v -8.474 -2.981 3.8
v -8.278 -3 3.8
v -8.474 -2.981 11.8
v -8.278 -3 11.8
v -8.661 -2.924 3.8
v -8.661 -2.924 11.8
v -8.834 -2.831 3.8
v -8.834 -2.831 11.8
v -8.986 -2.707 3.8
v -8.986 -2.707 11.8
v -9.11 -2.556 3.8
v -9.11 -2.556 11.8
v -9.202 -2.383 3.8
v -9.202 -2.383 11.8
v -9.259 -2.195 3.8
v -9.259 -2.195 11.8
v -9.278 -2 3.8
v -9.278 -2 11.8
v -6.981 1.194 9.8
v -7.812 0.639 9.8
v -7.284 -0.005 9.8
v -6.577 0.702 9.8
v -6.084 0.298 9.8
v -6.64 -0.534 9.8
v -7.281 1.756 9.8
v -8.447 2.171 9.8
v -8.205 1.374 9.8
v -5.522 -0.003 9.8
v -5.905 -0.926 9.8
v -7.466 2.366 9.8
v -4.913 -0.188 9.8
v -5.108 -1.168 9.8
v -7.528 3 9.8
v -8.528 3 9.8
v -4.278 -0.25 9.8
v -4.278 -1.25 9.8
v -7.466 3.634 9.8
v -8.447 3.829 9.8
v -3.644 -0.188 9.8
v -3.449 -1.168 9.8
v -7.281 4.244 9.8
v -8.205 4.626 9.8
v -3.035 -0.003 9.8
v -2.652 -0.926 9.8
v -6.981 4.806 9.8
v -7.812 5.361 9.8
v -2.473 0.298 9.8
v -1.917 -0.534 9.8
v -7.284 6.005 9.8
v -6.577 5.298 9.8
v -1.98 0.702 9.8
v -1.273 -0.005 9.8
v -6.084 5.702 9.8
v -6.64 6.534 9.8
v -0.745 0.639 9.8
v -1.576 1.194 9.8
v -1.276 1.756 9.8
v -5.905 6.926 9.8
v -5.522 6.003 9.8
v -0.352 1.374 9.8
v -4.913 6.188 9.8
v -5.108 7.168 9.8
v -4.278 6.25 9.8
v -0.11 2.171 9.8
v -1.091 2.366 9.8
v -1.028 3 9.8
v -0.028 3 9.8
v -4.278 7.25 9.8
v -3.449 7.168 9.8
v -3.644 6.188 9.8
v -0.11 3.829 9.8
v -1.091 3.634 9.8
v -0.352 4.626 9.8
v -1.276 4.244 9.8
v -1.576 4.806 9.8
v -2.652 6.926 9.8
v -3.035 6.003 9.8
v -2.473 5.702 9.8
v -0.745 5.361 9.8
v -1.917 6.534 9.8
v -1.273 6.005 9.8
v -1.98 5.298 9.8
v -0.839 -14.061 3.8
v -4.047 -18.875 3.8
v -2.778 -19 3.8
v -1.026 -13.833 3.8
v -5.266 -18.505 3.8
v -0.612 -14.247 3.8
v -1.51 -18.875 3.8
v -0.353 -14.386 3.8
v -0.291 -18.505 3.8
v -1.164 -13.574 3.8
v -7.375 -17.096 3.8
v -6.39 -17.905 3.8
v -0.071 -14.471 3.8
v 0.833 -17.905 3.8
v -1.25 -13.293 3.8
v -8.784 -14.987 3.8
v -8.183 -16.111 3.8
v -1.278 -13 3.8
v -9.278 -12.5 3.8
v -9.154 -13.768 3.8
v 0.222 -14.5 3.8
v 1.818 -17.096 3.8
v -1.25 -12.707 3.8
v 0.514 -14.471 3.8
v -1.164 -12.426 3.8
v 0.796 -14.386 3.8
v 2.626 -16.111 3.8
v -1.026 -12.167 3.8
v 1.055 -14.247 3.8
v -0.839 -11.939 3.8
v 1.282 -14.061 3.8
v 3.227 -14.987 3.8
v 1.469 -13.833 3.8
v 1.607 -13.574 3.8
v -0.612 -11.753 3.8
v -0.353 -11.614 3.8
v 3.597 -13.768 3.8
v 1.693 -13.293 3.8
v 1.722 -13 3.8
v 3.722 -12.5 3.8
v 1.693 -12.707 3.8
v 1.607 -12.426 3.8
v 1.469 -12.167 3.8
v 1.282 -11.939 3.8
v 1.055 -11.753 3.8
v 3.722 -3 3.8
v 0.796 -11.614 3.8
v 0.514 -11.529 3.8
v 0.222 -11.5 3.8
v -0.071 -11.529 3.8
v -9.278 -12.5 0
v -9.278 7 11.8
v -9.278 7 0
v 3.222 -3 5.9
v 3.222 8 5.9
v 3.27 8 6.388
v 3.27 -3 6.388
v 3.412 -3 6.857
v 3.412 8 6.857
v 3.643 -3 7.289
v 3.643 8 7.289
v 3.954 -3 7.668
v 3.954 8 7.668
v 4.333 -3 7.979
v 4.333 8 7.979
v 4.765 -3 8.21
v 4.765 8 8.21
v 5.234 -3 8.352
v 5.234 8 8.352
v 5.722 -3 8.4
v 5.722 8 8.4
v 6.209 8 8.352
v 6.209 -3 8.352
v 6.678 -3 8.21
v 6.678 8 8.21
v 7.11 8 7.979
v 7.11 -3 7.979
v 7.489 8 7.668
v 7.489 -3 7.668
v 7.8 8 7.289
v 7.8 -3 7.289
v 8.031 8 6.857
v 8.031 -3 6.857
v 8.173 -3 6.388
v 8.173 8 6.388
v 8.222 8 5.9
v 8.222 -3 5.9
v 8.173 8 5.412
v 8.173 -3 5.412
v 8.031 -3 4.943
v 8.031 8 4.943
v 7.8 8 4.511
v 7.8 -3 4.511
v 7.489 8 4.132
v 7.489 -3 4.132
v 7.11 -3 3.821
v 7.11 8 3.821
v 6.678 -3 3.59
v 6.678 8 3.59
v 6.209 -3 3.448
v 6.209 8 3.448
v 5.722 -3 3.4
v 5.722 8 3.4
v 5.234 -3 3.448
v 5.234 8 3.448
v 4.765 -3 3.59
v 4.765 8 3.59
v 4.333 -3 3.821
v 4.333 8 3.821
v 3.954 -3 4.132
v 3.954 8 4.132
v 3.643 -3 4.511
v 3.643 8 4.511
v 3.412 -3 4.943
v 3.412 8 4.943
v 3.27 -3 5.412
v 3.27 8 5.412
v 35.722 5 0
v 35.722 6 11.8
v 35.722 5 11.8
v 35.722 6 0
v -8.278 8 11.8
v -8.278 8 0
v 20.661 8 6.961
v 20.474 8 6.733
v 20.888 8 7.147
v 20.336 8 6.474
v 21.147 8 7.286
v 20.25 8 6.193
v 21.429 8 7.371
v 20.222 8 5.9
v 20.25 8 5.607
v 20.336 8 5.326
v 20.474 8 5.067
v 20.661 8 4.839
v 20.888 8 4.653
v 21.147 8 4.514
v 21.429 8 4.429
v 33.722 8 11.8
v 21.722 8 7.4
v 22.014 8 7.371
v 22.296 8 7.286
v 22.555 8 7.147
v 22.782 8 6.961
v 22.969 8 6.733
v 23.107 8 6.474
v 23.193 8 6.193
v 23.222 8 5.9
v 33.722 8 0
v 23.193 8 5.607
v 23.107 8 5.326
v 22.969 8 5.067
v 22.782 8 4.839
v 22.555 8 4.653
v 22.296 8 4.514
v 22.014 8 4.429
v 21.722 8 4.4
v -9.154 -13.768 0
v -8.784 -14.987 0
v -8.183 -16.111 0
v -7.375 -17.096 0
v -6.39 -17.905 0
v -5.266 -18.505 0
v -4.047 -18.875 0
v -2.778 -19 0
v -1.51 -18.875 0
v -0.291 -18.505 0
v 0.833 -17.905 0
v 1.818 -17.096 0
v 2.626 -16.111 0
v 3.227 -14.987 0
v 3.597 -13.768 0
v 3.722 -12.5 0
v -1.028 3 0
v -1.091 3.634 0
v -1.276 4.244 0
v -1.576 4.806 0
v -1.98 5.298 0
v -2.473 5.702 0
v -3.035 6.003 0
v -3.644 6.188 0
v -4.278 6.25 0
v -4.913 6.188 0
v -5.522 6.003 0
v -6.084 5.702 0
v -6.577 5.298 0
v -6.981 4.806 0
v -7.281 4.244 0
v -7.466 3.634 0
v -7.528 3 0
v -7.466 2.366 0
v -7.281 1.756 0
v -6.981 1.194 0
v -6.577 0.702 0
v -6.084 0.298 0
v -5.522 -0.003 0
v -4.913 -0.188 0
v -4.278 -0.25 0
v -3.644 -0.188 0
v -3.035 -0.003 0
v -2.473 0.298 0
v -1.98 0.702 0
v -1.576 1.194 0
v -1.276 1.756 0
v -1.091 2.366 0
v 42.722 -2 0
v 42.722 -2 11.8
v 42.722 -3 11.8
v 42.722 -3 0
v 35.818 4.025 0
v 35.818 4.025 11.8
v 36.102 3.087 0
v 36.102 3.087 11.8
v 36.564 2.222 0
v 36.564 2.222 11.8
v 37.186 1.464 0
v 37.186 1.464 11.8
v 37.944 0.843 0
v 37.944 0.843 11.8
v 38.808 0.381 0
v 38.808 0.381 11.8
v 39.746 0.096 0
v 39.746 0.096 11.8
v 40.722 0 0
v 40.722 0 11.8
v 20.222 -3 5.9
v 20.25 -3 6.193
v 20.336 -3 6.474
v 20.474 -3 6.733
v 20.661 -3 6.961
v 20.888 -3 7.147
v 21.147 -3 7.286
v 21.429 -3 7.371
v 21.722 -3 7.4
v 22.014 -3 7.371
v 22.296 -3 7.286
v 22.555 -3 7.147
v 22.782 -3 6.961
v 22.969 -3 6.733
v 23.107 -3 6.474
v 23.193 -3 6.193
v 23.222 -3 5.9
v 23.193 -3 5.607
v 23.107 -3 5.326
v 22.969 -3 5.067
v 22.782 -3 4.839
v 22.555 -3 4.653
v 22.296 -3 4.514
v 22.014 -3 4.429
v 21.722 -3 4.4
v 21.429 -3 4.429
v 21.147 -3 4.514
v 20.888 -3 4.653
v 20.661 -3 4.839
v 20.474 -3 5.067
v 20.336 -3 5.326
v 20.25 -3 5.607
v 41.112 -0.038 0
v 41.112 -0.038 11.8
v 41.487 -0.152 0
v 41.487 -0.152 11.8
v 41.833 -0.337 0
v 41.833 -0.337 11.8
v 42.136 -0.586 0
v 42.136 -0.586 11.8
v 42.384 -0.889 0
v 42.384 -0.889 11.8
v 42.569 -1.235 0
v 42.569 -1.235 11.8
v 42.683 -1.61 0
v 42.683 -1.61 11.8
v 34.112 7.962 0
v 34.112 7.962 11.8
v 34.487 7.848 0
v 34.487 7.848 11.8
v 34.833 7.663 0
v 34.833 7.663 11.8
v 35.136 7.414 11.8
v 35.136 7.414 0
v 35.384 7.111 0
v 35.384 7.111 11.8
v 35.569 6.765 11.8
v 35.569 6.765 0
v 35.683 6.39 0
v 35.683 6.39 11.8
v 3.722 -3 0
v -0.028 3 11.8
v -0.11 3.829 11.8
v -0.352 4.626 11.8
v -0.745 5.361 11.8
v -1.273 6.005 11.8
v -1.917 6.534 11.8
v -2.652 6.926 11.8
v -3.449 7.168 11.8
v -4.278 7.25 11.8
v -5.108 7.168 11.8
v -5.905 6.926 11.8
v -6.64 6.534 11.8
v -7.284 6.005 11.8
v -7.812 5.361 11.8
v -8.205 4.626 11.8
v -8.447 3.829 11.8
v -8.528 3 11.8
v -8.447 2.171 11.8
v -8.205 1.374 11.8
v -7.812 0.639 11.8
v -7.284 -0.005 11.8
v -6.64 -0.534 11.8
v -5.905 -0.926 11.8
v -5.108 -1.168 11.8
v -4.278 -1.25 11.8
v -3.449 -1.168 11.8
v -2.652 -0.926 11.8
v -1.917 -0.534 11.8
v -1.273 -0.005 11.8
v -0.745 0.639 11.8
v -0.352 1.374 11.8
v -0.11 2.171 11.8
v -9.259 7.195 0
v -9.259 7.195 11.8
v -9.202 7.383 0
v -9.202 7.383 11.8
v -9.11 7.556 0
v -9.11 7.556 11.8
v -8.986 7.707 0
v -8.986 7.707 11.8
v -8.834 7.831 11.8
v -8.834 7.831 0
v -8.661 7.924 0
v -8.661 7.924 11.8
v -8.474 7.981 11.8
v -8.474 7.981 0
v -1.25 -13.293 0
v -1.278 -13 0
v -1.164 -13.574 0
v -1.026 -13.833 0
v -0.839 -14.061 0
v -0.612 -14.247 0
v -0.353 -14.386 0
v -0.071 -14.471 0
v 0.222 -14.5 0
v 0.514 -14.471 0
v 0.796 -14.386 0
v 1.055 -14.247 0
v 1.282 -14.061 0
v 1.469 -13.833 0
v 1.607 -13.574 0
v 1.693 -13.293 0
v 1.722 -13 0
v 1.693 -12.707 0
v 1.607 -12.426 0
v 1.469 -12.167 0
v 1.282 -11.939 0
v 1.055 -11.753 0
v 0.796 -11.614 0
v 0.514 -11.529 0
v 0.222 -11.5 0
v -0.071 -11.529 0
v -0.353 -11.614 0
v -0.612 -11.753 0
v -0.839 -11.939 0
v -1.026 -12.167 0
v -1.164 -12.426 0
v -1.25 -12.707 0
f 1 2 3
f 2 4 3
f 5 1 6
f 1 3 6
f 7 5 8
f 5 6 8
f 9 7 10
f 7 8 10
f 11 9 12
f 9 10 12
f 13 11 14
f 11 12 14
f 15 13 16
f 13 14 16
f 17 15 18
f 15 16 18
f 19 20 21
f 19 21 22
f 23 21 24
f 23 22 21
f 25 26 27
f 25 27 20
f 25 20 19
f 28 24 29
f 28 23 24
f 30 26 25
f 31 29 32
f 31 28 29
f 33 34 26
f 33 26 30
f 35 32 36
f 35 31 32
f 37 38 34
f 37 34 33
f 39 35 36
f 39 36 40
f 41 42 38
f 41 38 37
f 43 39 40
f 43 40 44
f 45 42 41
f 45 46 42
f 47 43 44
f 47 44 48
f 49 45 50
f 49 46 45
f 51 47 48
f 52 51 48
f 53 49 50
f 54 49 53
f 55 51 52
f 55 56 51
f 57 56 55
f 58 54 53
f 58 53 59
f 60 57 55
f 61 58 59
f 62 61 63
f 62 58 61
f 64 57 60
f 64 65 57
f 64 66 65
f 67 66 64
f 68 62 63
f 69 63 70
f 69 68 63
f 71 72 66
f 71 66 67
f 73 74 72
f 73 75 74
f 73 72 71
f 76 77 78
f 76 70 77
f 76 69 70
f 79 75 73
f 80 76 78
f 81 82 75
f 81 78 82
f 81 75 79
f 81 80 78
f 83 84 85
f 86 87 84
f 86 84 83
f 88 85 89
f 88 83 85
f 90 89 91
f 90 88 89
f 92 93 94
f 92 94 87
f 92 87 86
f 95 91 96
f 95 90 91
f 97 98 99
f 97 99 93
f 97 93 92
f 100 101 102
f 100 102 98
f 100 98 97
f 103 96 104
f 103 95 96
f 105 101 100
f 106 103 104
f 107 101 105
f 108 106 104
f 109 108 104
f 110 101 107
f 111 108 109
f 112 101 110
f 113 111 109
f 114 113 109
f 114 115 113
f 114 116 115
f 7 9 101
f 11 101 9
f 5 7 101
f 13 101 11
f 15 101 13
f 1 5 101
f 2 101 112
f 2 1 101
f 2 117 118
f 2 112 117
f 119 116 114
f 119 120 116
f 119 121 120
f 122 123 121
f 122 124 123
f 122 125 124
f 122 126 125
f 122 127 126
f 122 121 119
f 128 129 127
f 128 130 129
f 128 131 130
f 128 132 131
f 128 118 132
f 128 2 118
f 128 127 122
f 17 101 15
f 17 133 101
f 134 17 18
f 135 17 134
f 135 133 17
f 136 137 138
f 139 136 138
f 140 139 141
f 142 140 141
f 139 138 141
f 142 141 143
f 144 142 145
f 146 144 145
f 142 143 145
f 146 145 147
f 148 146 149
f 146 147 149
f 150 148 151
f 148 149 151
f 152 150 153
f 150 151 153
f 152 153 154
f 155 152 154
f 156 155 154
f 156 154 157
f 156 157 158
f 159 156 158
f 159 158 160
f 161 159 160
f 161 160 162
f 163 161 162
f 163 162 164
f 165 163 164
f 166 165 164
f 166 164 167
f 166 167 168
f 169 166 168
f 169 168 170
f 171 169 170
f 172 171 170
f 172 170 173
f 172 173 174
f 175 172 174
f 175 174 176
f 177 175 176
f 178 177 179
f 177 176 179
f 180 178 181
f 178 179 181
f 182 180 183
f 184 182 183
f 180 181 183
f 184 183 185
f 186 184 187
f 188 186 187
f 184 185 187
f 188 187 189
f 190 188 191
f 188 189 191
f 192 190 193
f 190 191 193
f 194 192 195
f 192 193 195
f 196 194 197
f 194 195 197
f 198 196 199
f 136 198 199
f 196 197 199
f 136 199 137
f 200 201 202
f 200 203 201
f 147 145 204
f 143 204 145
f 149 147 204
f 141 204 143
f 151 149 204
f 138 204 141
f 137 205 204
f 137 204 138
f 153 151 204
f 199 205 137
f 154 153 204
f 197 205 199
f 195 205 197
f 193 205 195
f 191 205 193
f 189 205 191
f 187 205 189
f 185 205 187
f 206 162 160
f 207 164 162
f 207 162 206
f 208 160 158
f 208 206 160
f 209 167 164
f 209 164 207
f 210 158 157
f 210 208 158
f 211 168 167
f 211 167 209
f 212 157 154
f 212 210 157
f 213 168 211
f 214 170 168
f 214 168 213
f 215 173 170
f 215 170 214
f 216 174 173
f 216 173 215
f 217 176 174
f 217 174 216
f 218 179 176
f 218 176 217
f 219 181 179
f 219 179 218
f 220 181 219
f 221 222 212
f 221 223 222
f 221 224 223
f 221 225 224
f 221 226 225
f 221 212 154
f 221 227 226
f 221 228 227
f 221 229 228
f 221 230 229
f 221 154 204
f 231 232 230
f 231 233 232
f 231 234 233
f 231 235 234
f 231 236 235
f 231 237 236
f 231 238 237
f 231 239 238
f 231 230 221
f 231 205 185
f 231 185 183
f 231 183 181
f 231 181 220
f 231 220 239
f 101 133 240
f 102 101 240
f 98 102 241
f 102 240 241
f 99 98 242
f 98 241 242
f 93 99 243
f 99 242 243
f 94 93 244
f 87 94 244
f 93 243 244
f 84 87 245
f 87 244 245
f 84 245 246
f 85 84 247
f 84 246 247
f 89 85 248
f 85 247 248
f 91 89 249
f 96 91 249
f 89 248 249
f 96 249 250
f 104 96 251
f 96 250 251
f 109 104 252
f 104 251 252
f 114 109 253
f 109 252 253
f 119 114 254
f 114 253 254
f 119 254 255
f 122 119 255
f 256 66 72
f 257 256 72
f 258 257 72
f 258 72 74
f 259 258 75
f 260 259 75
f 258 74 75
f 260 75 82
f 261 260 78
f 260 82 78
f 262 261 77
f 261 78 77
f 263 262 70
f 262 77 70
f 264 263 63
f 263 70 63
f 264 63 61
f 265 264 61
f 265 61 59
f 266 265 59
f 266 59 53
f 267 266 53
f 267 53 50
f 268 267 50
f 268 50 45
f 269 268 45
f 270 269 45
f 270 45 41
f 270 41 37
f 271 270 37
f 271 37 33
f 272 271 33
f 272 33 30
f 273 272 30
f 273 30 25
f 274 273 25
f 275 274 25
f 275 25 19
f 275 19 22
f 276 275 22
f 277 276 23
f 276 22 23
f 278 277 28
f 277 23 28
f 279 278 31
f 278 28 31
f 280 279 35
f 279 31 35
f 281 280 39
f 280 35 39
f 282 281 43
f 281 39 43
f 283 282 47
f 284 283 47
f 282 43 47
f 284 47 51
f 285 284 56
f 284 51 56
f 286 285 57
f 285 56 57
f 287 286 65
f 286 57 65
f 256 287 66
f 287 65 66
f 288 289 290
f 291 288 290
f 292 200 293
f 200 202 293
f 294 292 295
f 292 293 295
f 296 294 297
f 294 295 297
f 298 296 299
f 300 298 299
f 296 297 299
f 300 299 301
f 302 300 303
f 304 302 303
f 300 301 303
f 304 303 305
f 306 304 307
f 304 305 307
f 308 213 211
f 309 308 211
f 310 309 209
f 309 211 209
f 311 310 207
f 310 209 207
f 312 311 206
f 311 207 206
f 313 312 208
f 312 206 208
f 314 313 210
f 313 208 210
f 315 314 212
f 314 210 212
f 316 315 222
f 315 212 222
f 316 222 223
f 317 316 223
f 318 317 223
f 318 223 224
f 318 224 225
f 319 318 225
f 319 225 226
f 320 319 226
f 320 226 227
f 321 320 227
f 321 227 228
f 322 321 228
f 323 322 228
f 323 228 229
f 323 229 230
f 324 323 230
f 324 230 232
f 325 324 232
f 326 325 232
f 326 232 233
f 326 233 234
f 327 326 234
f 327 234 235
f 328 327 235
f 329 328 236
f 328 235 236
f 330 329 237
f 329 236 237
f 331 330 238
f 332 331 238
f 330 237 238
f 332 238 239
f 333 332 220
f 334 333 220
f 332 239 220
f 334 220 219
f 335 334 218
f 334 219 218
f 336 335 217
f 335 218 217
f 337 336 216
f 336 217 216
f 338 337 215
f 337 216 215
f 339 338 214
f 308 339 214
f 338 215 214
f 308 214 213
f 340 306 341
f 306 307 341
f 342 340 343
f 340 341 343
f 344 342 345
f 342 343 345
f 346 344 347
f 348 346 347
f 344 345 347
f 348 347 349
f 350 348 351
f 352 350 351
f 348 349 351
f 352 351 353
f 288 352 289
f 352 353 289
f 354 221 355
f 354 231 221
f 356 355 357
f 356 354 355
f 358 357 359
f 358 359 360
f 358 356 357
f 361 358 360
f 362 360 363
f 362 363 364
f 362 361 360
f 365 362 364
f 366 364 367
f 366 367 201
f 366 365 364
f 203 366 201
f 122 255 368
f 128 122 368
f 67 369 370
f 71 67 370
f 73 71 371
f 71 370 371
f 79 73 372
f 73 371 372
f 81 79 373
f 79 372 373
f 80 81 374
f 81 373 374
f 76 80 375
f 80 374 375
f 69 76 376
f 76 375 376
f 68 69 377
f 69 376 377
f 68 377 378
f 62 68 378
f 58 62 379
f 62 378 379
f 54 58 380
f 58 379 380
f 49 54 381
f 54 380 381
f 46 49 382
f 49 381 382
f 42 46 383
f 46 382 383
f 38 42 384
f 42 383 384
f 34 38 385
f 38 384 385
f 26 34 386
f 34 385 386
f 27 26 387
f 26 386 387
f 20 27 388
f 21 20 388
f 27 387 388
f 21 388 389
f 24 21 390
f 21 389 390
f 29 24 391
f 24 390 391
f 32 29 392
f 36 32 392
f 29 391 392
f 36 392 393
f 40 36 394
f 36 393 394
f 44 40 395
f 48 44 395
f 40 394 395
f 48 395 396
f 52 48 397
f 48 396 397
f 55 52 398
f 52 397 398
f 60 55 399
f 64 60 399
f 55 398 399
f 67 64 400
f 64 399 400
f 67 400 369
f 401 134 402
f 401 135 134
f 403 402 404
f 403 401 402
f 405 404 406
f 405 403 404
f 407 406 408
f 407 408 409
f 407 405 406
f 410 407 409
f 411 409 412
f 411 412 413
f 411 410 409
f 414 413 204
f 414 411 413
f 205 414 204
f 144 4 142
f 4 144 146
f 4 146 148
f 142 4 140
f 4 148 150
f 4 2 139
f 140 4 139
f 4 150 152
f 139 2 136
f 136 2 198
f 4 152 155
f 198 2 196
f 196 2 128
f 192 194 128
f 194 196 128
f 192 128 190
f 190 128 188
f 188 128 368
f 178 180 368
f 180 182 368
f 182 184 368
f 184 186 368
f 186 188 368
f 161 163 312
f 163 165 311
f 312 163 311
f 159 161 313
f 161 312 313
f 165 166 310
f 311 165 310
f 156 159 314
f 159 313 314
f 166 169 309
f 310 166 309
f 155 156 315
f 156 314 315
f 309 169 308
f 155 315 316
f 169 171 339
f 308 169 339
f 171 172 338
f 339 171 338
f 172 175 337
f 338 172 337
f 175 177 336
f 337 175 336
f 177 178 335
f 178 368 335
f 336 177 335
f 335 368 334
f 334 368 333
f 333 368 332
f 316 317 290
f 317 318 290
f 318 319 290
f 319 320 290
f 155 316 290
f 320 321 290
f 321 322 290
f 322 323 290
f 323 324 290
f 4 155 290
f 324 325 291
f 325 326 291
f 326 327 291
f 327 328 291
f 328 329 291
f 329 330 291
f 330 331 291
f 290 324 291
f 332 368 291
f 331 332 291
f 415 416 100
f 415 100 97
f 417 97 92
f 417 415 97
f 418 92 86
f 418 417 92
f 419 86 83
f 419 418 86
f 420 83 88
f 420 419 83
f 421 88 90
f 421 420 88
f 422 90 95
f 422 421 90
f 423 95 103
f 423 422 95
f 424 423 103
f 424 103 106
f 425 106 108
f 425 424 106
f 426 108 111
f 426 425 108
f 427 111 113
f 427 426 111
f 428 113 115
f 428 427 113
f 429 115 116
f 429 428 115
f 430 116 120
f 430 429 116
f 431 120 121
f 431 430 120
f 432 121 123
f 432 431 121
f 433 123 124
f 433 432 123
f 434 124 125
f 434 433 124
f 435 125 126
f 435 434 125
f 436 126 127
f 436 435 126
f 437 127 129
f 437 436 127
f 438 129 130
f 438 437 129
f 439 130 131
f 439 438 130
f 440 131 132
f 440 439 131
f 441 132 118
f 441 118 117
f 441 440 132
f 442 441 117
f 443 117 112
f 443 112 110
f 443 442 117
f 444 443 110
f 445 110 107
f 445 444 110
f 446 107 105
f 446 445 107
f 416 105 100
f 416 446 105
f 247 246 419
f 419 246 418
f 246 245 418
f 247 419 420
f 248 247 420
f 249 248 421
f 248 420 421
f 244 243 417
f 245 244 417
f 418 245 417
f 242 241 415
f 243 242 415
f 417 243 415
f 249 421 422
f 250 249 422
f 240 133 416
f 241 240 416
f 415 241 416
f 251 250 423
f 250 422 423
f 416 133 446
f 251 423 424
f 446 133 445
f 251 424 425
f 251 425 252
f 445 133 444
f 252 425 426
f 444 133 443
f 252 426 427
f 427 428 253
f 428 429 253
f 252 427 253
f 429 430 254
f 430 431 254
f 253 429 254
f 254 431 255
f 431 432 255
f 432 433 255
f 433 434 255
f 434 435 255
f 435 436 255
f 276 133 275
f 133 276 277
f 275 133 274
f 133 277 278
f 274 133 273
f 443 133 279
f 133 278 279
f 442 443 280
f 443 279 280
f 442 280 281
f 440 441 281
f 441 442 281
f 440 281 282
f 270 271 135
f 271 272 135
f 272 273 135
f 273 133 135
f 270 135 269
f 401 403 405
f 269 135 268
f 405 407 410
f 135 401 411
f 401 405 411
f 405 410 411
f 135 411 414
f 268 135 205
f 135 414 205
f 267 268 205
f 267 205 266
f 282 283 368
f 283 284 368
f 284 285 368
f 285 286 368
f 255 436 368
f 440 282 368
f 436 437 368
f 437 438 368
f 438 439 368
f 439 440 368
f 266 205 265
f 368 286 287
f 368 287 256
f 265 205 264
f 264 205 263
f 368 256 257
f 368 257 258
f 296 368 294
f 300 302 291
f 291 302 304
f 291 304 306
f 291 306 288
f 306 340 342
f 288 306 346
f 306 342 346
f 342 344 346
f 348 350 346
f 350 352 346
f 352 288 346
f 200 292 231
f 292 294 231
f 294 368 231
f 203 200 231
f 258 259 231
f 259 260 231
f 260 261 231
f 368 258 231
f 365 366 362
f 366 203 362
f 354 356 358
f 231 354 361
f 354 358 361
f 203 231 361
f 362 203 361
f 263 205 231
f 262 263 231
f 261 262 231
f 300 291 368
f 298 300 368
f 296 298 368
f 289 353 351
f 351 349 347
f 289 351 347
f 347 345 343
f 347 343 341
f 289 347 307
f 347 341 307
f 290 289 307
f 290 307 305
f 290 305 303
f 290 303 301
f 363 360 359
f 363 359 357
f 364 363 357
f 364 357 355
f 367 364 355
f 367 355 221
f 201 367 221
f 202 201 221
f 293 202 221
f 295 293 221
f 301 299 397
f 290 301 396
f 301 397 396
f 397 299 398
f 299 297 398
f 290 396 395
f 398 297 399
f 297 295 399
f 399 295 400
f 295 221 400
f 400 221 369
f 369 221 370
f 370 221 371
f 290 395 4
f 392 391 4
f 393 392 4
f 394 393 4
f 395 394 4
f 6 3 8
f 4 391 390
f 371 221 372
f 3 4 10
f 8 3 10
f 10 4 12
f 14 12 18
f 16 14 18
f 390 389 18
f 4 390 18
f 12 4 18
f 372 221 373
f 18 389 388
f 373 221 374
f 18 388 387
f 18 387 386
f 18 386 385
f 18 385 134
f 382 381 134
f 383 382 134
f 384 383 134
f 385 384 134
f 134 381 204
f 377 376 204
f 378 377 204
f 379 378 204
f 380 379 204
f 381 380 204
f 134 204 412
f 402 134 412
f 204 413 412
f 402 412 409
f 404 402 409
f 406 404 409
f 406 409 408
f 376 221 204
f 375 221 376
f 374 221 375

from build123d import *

# Parameters (mm, degrees)
SKETCH_1_R          = 1.5
EXTRUDE_1_DEPTH     = 3.8
EXTRUDE_2_DEPTH     = 8
SKETCH_3_R          = 3.25
CUT_EXTRUDE_1_DEPTH = 49.22207155
SKETCH_4_R          = 4.25
CUT_EXTRUDE_2_DEPTH = 2
FILLET_2_R          = 1
FILLET_3_R          = 2
FILLET_4_R          = 5
FILLET_5_R          = 2
SKETCH_5_R          = 2.5
SKETCH_5_R_2        = 1.5
CUT_EXTRUDE_3_DEPTH = 52.897670319


with BuildPart() as part:
    # 草图1 → 凸台-拉伸1 (new body)
    with BuildSketch(Plane.XY):
        with BuildLine():
            Line((35.721518987, -3), (42.721518987, -3))
            Line((42.721518987, -3), (42.721518987, 0))
            Line((42.721518987, 0), (35.721518987, 0))
            Line((35.721518987, 0), (35.721518987, 8))
            Line((35.721518987, 8), (-9.278481013, 8))
            Line((-9.278481013, 8), (-9.278481013, -3))
            Line((-9.278481013, -3), (-9.278481013, -12.5))
            ThreePointArc((-9.278481013, -12.5), (-2.778481013, -19), (3.721518987, -12.5))
            Line((3.721518987, -12.5), (3.721518987, -3))
            Line((3.721518987, -3), (35.721518987, -3))
        make_face()
        with Locations(Location((0.221518987, -13, 0), (0, 0, 180))):
            Circle(SKETCH_1_R, mode=Mode.SUBTRACT)
    extrude(amount=EXTRUDE_1_DEPTH)

    # 草图2 → 凸台-拉伸2 (add)
    with BuildSketch(Plane.XY.offset(3.8)):
        Polygon((3.721518987, -3), (-9.278481013, -3), (-9.278481013, 8), (35.721518987, 8), (35.721518987, 0), (42.721518987, 0), (42.721518987, -3), align=None)
    extrude(amount=EXTRUDE_2_DEPTH)

    # 草图3 → 切除-拉伸1 (cut, through all)
    with BuildSketch(Plane.XY.offset(11.8)):
        with Locations((-4.278481013, 3)):
            Circle(SKETCH_3_R)
    extrude(amount=-CUT_EXTRUDE_1_DEPTH, mode=Mode.SUBTRACT)

    # 草图4 → 切除-拉伸2 (cut)
    with BuildSketch(Plane.XY.offset(11.8)):
        with Locations((-4.278481013, 3)):
            Circle(SKETCH_4_R)
    extrude(amount=-CUT_EXTRUDE_2_DEPTH, mode=Mode.SUBTRACT)

    # 圆角2
    fillet_2_edges = [part.edges().sort_by_distance(p)[0] for p in [
        (-9.278481013, 8, 5.9),
        (-9.278481013, -3, 7.8),
    ]]
    fillet(fillet_2_edges, radius=FILLET_2_R)

    # 圆角3
    fillet_3_edges = [part.edges().sort_by_distance(p)[0] for p in [
        (35.721518987, 8, 5.9),
    ]]
    fillet(fillet_3_edges, radius=FILLET_3_R)

    # 圆角4
    fillet_4_edges = [part.edges().sort_by_distance(p)[0] for p in [
        (35.721518987, 0, 5.9),
    ]]
    fillet(fillet_4_edges, radius=FILLET_4_R)

    # 圆角5
    fillet_5_edges = [part.edges().sort_by_distance(p)[0] for p in [
        (42.721518987, 0, 5.9),
    ]]
    fillet(fillet_5_edges, radius=FILLET_5_R - 0.0001)  # a hair under: the kernel refuses the full size

    # 草图5 → 切除-拉伸3 (cut, through all)
    with BuildSketch(Plane(origin=(0, 8, 0), x_dir=(1, 0, 0), z_dir=(0, 1, 0))):
        with Locations(Location((5.721518987, -5.9, 0), (0, 0, 180))):
            Circle(SKETCH_5_R)
        with Locations(Location((21.721518987, -5.9, 0), (0, 0, 180))):
            Circle(SKETCH_5_R_2)
    extrude(amount=-CUT_EXTRUDE_3_DEPTH, mode=Mode.SUBTRACT)


solid = part.part
